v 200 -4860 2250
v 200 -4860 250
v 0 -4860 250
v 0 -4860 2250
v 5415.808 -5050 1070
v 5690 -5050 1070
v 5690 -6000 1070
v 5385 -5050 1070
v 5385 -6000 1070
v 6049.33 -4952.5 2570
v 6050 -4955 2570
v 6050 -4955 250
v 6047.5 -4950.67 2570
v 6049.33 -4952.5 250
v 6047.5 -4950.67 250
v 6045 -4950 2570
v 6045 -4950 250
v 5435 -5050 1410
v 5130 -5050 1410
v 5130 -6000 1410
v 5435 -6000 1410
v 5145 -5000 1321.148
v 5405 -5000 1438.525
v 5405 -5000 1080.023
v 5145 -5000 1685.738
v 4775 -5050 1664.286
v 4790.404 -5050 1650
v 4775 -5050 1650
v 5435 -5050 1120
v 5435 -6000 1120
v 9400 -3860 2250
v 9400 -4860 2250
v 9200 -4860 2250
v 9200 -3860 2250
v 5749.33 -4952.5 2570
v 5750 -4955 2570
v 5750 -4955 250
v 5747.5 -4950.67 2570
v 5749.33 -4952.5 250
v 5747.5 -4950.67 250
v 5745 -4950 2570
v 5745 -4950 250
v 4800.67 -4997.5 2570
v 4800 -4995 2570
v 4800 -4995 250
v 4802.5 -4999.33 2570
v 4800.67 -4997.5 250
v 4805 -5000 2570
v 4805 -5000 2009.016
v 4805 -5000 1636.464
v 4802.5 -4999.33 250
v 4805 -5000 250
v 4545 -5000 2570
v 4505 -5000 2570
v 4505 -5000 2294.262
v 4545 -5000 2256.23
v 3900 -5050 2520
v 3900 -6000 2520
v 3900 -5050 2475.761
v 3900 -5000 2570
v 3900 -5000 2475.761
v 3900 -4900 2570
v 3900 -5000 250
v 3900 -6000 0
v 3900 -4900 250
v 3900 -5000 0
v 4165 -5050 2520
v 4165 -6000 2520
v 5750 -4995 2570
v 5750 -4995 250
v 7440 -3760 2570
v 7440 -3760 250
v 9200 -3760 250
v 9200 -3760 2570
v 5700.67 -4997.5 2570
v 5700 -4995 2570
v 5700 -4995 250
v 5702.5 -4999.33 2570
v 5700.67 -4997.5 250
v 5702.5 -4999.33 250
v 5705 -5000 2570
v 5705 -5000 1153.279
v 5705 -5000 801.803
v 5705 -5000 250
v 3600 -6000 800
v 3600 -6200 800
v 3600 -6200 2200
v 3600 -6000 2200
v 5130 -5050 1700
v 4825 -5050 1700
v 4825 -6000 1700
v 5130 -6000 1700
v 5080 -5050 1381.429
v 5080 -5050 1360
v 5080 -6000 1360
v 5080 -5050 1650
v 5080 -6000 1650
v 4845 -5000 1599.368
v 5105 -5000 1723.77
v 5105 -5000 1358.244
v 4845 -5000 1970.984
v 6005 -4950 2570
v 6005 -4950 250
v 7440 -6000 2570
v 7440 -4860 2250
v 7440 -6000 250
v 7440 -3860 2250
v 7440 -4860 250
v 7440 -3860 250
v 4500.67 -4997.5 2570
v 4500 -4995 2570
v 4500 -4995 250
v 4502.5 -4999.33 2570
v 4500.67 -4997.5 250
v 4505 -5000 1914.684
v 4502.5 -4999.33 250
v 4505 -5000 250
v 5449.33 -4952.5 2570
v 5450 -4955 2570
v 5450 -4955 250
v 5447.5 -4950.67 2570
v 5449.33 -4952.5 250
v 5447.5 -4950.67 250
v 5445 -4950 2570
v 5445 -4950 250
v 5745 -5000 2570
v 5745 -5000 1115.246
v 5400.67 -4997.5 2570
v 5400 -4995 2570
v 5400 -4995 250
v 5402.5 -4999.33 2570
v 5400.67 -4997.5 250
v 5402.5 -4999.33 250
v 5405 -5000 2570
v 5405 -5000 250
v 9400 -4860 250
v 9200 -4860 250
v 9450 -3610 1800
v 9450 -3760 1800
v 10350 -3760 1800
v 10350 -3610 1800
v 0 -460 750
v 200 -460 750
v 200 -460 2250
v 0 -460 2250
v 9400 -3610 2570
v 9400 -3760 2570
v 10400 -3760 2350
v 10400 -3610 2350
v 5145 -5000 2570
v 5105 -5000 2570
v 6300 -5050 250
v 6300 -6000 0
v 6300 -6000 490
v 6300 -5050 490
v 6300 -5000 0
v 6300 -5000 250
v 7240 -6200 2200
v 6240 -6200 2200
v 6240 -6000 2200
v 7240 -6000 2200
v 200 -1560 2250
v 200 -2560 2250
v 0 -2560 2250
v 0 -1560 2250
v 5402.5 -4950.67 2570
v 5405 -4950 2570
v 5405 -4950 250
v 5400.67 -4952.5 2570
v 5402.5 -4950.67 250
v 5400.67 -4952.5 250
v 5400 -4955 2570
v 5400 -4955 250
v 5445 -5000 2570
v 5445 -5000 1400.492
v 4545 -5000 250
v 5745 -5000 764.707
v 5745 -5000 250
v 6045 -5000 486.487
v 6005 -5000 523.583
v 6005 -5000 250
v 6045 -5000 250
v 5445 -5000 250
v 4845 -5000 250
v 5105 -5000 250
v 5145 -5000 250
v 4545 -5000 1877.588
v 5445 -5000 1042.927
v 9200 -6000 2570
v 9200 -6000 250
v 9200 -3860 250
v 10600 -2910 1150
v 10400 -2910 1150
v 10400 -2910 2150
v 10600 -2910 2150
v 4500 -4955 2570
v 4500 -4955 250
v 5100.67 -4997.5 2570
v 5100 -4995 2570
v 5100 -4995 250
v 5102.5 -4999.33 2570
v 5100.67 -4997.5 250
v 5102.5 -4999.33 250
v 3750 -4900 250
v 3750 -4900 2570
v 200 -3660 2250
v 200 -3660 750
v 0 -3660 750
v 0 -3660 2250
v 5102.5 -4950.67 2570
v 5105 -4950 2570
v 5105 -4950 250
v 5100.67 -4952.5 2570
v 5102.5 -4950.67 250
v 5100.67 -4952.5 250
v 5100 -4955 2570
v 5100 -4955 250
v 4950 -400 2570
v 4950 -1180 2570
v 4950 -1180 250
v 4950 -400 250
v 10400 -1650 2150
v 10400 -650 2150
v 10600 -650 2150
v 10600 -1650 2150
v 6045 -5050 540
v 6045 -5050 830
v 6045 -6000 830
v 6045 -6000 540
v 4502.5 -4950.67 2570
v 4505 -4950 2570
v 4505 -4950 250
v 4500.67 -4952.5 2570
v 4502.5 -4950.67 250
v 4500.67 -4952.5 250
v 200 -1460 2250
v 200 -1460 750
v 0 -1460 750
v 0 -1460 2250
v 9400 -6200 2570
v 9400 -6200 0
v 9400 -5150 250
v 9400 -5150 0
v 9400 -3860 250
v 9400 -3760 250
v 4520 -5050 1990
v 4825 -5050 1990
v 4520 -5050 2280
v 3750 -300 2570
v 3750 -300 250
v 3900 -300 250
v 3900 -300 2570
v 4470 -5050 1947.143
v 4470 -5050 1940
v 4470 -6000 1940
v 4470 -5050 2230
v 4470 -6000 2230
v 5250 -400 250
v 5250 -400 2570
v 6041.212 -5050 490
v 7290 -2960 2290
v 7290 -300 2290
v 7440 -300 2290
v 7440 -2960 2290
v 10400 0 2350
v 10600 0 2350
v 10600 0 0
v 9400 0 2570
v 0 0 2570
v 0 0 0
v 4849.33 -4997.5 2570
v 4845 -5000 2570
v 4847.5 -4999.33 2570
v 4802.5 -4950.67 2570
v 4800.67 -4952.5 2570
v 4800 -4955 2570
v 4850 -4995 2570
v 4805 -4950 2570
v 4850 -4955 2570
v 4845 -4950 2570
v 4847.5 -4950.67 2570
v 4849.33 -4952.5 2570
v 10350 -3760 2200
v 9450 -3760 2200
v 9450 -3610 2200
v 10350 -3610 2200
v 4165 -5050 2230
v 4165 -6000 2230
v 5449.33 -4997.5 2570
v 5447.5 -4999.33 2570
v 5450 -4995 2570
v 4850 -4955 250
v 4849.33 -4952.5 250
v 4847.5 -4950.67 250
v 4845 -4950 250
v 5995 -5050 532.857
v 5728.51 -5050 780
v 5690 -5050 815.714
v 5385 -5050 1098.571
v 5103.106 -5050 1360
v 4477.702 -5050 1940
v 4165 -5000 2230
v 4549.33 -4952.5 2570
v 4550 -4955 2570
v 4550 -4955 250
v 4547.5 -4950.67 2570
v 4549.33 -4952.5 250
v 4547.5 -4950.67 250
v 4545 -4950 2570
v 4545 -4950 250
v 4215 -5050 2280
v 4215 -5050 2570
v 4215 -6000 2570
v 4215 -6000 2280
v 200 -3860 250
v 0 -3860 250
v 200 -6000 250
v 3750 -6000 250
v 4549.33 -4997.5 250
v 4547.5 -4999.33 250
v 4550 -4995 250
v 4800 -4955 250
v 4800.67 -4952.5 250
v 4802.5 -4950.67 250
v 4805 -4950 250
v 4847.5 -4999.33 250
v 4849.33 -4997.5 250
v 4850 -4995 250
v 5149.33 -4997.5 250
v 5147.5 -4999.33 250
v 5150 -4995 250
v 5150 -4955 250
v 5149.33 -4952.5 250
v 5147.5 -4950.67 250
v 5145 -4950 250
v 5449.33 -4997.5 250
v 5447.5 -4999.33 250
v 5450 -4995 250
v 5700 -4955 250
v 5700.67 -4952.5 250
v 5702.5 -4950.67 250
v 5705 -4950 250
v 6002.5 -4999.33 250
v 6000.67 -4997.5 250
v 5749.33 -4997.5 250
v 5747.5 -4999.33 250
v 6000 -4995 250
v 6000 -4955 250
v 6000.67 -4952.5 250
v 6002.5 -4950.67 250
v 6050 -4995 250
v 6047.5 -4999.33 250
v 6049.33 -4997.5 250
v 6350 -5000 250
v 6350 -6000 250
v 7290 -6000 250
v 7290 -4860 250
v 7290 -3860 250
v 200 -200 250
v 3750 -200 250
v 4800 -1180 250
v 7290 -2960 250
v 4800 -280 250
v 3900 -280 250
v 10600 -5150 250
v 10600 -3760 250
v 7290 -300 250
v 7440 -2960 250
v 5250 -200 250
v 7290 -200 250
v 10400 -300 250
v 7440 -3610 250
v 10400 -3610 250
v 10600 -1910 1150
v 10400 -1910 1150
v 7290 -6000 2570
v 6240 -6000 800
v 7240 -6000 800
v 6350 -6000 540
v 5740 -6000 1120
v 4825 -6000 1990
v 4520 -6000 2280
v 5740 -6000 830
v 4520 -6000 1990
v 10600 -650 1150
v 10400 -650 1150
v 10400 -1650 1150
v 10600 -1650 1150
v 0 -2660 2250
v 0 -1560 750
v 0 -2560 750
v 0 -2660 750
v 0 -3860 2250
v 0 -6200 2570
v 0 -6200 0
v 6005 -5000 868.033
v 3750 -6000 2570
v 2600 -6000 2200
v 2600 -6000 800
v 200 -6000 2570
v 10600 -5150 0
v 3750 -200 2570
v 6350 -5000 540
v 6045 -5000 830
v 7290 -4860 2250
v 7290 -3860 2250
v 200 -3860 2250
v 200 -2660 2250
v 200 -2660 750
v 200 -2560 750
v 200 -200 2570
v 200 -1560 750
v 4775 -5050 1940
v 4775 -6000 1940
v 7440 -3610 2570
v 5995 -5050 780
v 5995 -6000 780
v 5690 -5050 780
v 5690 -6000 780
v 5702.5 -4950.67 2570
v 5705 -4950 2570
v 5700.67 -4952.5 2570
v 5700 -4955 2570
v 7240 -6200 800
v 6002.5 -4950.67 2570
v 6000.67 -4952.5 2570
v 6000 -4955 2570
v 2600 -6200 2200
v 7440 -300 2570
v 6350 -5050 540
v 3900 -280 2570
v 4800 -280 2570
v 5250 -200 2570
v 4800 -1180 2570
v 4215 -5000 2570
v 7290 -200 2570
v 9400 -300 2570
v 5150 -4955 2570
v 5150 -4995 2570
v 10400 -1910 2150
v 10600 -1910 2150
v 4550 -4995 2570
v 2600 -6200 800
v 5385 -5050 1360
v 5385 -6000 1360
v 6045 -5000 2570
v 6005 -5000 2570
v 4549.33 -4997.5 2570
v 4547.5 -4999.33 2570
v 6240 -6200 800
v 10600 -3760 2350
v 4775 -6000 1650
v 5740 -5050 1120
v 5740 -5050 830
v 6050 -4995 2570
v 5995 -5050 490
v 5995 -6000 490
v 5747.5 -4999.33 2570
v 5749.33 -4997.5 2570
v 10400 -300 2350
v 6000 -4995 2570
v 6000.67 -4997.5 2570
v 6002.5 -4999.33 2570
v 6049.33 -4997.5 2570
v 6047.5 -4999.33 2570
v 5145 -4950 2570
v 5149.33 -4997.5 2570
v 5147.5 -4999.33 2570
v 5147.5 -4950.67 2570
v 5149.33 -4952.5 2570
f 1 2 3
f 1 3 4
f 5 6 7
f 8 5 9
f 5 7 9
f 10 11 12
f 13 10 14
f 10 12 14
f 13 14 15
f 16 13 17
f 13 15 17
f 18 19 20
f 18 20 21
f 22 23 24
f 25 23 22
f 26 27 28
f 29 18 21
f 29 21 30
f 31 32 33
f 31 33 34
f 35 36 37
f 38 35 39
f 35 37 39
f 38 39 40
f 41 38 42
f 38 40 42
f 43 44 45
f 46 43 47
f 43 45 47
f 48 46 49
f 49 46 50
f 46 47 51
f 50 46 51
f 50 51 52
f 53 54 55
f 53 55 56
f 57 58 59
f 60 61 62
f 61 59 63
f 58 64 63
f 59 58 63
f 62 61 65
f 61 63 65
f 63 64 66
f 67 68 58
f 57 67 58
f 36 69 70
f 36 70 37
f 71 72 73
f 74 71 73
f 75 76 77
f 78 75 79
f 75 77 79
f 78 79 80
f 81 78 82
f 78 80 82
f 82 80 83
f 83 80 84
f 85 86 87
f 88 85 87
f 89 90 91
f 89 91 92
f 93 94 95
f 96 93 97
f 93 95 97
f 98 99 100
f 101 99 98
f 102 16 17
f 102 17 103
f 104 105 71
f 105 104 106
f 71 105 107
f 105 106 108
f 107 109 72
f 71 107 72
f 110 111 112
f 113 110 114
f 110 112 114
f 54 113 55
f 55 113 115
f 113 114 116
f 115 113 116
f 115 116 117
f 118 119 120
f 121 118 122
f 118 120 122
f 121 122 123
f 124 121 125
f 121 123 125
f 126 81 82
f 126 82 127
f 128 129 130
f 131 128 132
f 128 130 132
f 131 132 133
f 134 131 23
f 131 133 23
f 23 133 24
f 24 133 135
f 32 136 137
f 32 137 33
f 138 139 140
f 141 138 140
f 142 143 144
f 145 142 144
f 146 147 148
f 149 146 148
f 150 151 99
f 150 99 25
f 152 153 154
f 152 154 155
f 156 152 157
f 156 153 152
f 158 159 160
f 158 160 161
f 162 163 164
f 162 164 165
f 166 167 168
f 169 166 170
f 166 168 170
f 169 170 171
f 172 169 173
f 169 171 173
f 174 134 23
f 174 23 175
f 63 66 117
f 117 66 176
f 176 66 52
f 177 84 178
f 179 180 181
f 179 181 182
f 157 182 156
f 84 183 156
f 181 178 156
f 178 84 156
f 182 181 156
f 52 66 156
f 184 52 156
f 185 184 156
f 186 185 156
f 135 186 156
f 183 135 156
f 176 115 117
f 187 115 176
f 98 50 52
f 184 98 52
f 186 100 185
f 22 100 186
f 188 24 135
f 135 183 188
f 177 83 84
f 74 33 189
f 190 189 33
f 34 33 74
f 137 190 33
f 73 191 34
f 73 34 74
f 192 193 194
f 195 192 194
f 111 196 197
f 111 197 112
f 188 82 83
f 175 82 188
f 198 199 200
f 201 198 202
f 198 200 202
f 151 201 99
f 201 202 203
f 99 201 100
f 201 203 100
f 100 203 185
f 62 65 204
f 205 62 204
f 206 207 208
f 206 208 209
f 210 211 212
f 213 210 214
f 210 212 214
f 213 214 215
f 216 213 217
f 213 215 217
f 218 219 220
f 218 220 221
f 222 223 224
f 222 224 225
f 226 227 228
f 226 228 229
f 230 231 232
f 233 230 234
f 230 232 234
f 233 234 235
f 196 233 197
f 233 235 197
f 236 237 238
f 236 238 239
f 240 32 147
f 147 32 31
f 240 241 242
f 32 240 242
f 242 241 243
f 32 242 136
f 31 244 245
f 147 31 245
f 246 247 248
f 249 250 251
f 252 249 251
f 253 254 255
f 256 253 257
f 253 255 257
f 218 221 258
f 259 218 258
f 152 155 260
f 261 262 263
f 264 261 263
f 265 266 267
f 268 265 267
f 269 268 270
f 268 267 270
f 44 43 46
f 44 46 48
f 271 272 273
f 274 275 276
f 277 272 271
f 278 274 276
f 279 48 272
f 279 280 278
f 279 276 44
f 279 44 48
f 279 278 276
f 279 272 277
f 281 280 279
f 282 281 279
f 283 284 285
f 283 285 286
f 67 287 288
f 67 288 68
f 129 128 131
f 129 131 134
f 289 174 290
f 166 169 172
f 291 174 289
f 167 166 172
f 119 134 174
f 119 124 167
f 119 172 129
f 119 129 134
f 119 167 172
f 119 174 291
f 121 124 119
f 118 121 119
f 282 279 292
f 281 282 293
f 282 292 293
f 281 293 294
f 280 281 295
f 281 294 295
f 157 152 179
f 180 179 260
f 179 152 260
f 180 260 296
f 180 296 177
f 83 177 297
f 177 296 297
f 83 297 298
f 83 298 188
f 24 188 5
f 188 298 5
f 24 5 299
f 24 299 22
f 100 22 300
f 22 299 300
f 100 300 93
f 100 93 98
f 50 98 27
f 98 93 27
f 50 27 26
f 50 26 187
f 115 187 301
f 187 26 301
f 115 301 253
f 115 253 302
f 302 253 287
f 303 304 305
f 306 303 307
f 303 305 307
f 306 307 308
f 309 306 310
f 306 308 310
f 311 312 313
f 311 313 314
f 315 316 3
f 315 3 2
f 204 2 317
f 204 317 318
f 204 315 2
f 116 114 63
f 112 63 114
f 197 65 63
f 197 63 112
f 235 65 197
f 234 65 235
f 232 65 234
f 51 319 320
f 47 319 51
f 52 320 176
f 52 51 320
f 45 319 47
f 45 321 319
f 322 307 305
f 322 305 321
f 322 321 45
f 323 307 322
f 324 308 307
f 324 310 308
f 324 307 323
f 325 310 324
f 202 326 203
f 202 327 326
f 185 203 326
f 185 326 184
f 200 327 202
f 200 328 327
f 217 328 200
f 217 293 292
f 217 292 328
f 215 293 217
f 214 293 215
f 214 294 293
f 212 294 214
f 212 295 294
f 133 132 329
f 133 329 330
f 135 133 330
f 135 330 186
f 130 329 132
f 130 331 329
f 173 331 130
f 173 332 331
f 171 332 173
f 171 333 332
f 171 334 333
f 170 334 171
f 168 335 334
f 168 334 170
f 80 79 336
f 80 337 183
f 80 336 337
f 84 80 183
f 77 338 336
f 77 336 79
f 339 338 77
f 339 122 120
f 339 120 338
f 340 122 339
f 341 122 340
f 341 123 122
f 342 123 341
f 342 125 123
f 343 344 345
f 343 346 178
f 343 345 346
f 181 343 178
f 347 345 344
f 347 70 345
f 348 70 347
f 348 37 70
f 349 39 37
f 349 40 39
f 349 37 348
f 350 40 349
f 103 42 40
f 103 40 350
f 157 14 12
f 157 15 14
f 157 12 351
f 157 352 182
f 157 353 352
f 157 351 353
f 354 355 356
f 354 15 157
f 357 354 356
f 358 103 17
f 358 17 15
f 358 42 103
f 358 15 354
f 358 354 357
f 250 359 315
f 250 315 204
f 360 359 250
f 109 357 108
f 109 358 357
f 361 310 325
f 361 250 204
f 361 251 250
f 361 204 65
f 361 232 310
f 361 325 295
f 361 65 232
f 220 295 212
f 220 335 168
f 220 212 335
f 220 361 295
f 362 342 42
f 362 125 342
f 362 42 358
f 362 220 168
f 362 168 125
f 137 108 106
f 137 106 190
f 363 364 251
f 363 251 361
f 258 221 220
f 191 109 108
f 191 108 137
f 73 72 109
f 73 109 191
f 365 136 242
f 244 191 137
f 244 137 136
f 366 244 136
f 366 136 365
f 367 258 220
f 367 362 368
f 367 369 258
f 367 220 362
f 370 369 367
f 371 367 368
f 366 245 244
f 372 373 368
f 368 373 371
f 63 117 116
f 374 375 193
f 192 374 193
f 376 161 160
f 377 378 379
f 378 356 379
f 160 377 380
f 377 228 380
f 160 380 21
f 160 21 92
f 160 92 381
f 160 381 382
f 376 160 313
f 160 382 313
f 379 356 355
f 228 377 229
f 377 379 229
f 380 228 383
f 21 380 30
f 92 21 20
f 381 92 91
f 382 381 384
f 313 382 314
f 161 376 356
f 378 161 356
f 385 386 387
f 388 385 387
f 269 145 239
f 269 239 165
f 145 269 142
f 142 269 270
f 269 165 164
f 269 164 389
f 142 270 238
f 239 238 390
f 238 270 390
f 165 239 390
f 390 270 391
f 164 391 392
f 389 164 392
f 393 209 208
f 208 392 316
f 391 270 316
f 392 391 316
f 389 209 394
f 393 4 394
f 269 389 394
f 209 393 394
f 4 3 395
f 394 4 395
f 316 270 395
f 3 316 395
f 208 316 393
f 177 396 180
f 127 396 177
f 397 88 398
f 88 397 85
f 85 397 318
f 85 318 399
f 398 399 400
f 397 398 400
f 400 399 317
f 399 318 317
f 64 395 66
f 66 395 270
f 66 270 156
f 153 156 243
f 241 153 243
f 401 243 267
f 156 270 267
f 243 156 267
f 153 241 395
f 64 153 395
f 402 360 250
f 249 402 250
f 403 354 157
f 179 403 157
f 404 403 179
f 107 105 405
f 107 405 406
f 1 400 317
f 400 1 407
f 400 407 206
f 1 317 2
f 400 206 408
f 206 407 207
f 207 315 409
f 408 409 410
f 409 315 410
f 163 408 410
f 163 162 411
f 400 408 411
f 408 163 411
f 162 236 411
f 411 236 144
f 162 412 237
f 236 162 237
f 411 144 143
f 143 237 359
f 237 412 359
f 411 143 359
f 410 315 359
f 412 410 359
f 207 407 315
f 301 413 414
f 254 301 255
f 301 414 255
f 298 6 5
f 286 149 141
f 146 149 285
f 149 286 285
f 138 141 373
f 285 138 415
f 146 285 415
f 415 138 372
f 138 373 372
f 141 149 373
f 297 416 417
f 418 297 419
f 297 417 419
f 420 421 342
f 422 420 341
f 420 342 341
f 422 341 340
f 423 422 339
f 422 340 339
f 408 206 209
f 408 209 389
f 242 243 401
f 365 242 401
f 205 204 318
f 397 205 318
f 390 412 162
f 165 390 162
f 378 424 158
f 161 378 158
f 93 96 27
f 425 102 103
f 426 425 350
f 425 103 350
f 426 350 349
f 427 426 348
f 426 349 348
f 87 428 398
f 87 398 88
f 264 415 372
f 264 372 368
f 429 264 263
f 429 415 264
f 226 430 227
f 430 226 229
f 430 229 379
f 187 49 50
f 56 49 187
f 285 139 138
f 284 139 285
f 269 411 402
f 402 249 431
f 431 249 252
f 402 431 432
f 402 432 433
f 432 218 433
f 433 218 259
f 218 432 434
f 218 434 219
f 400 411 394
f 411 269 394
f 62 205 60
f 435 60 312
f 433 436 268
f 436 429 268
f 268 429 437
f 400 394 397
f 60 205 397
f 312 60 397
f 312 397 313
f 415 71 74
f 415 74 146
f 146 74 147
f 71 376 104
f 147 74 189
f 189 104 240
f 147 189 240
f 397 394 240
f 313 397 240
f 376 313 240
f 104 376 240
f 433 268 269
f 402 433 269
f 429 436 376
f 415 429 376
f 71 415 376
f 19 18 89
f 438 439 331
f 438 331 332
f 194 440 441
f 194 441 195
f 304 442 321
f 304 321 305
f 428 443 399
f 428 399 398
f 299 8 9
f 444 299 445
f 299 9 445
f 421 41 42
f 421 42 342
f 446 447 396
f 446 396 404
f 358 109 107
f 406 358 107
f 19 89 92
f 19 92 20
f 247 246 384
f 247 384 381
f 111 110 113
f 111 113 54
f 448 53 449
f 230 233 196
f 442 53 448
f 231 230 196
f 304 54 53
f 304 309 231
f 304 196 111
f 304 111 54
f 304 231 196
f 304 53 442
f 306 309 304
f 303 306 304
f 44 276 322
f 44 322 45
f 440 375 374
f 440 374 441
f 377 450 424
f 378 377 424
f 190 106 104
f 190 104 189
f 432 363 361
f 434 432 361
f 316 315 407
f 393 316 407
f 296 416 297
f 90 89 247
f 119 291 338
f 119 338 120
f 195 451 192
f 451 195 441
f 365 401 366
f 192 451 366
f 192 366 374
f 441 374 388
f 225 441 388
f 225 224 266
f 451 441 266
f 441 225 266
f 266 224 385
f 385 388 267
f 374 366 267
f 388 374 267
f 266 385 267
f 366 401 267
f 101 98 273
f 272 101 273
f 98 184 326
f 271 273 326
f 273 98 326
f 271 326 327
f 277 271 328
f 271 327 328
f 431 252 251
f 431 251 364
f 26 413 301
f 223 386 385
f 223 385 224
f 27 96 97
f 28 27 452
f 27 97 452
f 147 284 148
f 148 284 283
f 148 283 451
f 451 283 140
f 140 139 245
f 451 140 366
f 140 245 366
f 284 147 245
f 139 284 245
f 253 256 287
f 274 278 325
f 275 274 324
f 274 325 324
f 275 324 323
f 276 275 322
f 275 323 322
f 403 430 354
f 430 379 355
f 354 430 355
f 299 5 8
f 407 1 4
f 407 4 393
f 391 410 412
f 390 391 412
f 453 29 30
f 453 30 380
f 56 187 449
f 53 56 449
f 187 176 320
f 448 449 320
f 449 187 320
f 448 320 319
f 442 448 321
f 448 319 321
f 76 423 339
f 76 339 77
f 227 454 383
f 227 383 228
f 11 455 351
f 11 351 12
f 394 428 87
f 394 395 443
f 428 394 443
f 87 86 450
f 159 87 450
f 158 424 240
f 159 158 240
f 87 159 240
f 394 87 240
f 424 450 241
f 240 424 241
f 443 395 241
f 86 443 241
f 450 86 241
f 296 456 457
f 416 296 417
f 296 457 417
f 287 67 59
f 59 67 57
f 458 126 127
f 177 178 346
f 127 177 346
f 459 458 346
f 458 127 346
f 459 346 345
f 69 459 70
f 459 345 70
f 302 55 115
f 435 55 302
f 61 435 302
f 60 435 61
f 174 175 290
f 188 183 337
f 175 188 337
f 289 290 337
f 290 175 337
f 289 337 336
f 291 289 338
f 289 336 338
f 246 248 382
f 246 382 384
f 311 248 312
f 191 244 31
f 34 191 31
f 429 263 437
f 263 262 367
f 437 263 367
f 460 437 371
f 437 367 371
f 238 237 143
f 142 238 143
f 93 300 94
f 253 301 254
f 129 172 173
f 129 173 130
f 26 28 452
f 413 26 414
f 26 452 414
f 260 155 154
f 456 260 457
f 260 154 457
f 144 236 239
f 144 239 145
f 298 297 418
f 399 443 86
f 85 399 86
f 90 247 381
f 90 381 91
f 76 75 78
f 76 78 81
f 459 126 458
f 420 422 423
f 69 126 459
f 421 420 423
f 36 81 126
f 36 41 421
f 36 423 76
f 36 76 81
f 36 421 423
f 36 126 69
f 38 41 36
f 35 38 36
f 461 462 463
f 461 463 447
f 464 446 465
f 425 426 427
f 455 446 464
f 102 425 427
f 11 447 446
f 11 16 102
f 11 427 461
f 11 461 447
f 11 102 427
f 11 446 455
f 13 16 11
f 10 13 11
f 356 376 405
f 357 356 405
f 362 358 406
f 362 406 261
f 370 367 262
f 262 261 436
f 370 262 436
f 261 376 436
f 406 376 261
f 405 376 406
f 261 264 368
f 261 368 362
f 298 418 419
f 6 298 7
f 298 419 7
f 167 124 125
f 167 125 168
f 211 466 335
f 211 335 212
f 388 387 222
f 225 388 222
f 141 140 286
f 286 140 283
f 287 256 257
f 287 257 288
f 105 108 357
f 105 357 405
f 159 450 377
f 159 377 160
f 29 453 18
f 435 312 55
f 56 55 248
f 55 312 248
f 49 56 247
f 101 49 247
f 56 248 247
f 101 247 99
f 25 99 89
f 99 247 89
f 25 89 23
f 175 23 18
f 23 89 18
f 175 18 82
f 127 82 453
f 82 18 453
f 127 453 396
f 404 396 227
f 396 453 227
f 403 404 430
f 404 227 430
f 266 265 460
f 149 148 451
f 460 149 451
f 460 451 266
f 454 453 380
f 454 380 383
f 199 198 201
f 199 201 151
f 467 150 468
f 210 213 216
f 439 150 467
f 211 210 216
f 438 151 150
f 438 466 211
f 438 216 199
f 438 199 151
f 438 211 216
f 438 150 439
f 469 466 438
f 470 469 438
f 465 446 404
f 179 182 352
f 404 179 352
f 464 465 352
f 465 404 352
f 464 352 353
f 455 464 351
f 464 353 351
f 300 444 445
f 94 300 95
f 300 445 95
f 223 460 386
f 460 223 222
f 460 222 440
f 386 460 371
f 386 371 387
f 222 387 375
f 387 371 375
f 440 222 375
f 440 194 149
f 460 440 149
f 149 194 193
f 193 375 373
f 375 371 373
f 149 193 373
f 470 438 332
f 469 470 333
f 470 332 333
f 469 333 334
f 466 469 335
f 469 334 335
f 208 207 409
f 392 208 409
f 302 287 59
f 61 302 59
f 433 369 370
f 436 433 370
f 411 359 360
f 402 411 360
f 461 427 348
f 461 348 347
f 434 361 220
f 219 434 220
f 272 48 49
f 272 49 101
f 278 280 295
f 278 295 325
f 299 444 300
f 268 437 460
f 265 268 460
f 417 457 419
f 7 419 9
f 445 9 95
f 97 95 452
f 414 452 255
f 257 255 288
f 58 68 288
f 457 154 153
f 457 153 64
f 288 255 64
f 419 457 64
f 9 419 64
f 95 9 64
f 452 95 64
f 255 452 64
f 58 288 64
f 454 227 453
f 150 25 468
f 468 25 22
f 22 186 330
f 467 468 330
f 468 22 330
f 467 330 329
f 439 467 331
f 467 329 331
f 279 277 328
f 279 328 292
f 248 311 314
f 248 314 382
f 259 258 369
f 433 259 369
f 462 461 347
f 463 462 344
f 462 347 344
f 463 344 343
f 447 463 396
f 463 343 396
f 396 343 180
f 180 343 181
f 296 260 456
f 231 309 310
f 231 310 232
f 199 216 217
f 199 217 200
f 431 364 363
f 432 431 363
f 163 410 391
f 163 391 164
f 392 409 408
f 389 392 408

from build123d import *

# Parameters (mm, degrees)
F0_W      = 2400
F0_H      = 1000
F1_DEPTH  = 250
F2_W      = 1760
F2_H      = 2240
F3_DEPTH  = 2320
F4_W      = 1000
F4_H      = 2000
F5_DEPTH  = 9400.001
F6_W      = 1000
F6_H      = 1400
F6_W_2    = 900
F6_H_2    = 400
F7_DEPTH  = 5900
F8_W      = 1000
F8_H      = 1000
F9_DEPTH  = 200
F10_W     = 1000
F10_H     = 1500
F11_DEPTH = 200
F12_W     = 150
F12_H     = 2660
F13_DEPTH = 280
F15_DEPTH = 950
F17_DEPTH = 50
F19_DEPTH = 2320
F21_DEPTH = 3760.001


with BuildPart() as f1:
    # F0 (on Top) → F1 (new body)
    with BuildSketch(Plane.XY):
        Polygon((10600, 0), (0, 0), (0, -6200), (9400, -6200), (9400, -5150), (10600, -5150), align=None)
        with Locations((5100, -5500)):
            Rectangle(F0_W, F0_H, mode=Mode.SUBTRACT)
    extrude(amount=F1_DEPTH)

    # F2 (on face) → F3 (join)
    with BuildSketch(Plane.XY.offset(250)):
        Polygon((10600, 0), (0, 0), (0, -6200), (9400, -6200), (9400, -3760), (10600, -3760), align=None)
        with Locations((8320, -4880)):
            Rectangle(F2_W, F2_H, mode=Mode.SUBTRACT)
        Polygon((200, -6000), (200, -200), (3750, -200), (3750, -300), (3900, -300), (3900, -280), (4800, -280), (4800, -1180), (4950, -1180), (4950, -400), (5250, -400), (5250, -200), (7290, -200), (7290, -300), (7440, -300), (10400, -300), (10400, -3610), (7440, -3610), (7440, -2960), (7290, -2960), (7290, -6000), (3900, -6000), (3900, -4900), (3750, -4900), (3750, -6000), align=None, mode=Mode.SUBTRACT)
    extrude(amount=F3_DEPTH)

    # F4 (on face) → F5 (cut, through all)
    with BuildSketch(Plane.YZ.offset(9400)):
        with Locations((-4360, 1250)):
            Rectangle(F4_W, F4_H)
    extrude(amount=-F5_DEPTH, mode=Mode.SUBTRACT)

    # F6 (on face) → F7 (cut, through all)
    with BuildSketch(Plane.XZ.offset(6200)):
        with Locations((6740, 1500)):
            Rectangle(F6_W, F6_H)
        with Locations((3100, 1500)):
            Rectangle(F6_W, F6_H)
        with Locations((9900, 2000)):
            Rectangle(F6_W_2, F6_H_2)
    extrude(amount=-F7_DEPTH, mode=Mode.SUBTRACT)

    # F8 (on face) → F9 (cut, through all)
    with BuildSketch(Plane(origin=(10400, 0, 0), x_dir=(0, -1, 0), z_dir=(-1, 0, 0))):
        with Locations((1150, 1650)):
            Rectangle(F8_W, F8_H)
        with Locations((2410, 1650)):
            Rectangle(F8_W, F8_H)
    extrude(amount=-F9_DEPTH, mode=Mode.SUBTRACT)

    # F10 (on face) → F11 (cut, through all)
    with BuildSketch(Plane.YZ.offset(200)):
        with Locations((-3160, 1500)):
            Rectangle(F10_W, F10_H)
        with Locations((-2060, 1500)):
            Rectangle(F10_W, F10_H)
        with Locations((-960, 1500)):
            Rectangle(F10_W, F10_H)
    extrude(amount=-F11_DEPTH, mode=Mode.SUBTRACT)

    # F12 (on face) → F13 (join)
    with BuildSketch(Plane.XY.offset(2570)):
        with Locations((7365, -1630)):
            Rectangle(F12_W, F12_H)
    extrude(amount=-F13_DEPTH)

    # F14 (on face) → F15 (join)
    with BuildSketch(Plane(origin=(0, -6000, 0), x_dir=(-1, 0, 0), z_dir=(0, 1, 0))):
        Polygon((-6350, 540), (-6350, 250), (-6300, 250), (-6300, 490), (-5995, 490), (-5995, 780), (-5690, 780), (-5690, 1070), (-5385, 1070), (-5385, 1360), (-5080, 1360), (-5080, 1650), (-4775, 1650), (-4775, 1940), (-4470, 1940), (-4470, 2230), (-4165, 2230), (-4165, 2520), (-3900, 2520), (-3900, 2570), (-4215, 2570), (-4215, 2280), (-4520, 2280), (-4520, 1990), (-4825, 1990), (-4825, 1700), (-5130, 1700), (-5130, 1410), (-5435, 1410), (-5435, 1120), (-5740, 1120), (-5740, 830), (-6045, 830), (-6045, 540), align=None)
    extrude(amount=F15_DEPTH)

    # F16 (on face) → F17 (join)
    with BuildSketch(Plane(origin=(0, -5050, 0), x_dir=(-1, 0, 0), z_dir=(0, 1, 0))):
        Polygon((-4215, 2570), (-6350, 540), (-6350, 250), (-6300, 250), (-4165, 2230), (-3900, 2475.761124), (-3900, 2570), align=None)
    extrude(amount=F17_DEPTH)

    # F18 (on face) → F19 (join)
    with BuildSketch(Plane.XY.offset(250)):
        with BuildLine():
            Line((6005, -5000), (6045, -5000))
            ThreePointArc((6045, -5000), (6048.535534, -4998.535534), (6050, -4995))
            Line((6050, -4995), (6050, -4955))
            ThreePointArc((6050, -4955), (6048.535534, -4951.464466), (6045, -4950))
            Line((6045, -4950), (6005, -4950))
            ThreePointArc((6005, -4950), (6001.464466, -4951.464466), (6000, -4955))
            Line((6000, -4955), (6000, -4995))
            ThreePointArc((6000, -4995), (6001.464466, -4998.535534), (6005, -5000))
        make_face()
        with BuildLine():
            Line((5705, -5000), (5745, -5000))
            ThreePointArc((5745, -5000), (5748.535534, -4998.535534), (5750, -4995))
            Line((5750, -4995), (5750, -4955))
            ThreePointArc((5750, -4955), (5748.535534, -4951.464466), (5745, -4950))
            Line((5745, -4950), (5705, -4950))
            ThreePointArc((5705, -4950), (5701.464466, -4951.464466), (5700, -4955))
            Line((5700, -4955), (5700, -4995))
            ThreePointArc((5700, -4995), (5701.464466, -4998.535534), (5705, -5000))
        make_face()
        with BuildLine():
            Line((5405, -5000), (5445, -5000))
            ThreePointArc((5445, -5000), (5448.535534, -4998.535534), (5450, -4995))
            Line((5450, -4995), (5450, -4955))
            ThreePointArc((5450, -4955), (5448.535534, -4951.464466), (5445, -4950))
            Line((5445, -4950), (5405, -4950))
            ThreePointArc((5405, -4950), (5401.464466, -4951.464466), (5400, -4955))
            Line((5400, -4955), (5400, -4995))
            ThreePointArc((5400, -4995), (5401.464466, -4998.535534), (5405, -5000))
        make_face()
        with BuildLine():
            Line((5105, -5000), (5145, -5000))
            ThreePointArc((5145, -5000), (5148.535534, -4998.535534), (5150, -4995))
            Line((5150, -4995), (5150, -4955))
            ThreePointArc((5150, -4955), (5148.535534, -4951.464466), (5145, -4950))
            Line((5145, -4950), (5105, -4950))
            ThreePointArc((5105, -4950), (5101.464466, -4951.464466), (5100, -4955))
            Line((5100, -4955), (5100, -4995))
            ThreePointArc((5100, -4995), (5101.464466, -4998.535534), (5105, -5000))
        make_face()
        with BuildLine():
            Line((4805, -5000), (4845, -5000))
            ThreePointArc((4845, -5000), (4848.535534, -4998.535534), (4850, -4995))
            Line((4850, -4995), (4850, -4955))
            ThreePointArc((4850, -4955), (4848.535534, -4951.464466), (4845, -4950))
            Line((4845, -4950), (4805, -4950))
            ThreePointArc((4805, -4950), (4801.464466, -4951.464466), (4800, -4955))
            Line((4800, -4955), (4800, -4995))
            ThreePointArc((4800, -4995), (4801.464466, -4998.535534), (4805, -5000))
        make_face()
        with BuildLine():
            Line((4505, -5000), (4545, -5000))
            ThreePointArc((4545, -5000), (4548.535534, -4998.535534), (4550, -4995))
            Line((4550, -4995), (4550, -4955))
            ThreePointArc((4550, -4955), (4548.535534, -4951.464466), (4545, -4950))
            Line((4545, -4950), (4505, -4950))
            ThreePointArc((4505, -4950), (4501.464466, -4951.464466), (4500, -4955))
            Line((4500, -4955), (4500, -4995))
            ThreePointArc((4500, -4995), (4501.464466, -4998.535534), (4505, -5000))
        make_face()
    extrude(amount=F19_DEPTH)

    # F20 (on face) → F21 (cut, through all)
    with BuildSketch(Plane.XZ.offset(3760)):
        Polygon((10600, 2570), (9400, 2570), (10400, 2350), (10600, 2350), align=None)
    extrude(amount=-F21_DEPTH, mode=Mode.SUBTRACT)


solid = f1.part
